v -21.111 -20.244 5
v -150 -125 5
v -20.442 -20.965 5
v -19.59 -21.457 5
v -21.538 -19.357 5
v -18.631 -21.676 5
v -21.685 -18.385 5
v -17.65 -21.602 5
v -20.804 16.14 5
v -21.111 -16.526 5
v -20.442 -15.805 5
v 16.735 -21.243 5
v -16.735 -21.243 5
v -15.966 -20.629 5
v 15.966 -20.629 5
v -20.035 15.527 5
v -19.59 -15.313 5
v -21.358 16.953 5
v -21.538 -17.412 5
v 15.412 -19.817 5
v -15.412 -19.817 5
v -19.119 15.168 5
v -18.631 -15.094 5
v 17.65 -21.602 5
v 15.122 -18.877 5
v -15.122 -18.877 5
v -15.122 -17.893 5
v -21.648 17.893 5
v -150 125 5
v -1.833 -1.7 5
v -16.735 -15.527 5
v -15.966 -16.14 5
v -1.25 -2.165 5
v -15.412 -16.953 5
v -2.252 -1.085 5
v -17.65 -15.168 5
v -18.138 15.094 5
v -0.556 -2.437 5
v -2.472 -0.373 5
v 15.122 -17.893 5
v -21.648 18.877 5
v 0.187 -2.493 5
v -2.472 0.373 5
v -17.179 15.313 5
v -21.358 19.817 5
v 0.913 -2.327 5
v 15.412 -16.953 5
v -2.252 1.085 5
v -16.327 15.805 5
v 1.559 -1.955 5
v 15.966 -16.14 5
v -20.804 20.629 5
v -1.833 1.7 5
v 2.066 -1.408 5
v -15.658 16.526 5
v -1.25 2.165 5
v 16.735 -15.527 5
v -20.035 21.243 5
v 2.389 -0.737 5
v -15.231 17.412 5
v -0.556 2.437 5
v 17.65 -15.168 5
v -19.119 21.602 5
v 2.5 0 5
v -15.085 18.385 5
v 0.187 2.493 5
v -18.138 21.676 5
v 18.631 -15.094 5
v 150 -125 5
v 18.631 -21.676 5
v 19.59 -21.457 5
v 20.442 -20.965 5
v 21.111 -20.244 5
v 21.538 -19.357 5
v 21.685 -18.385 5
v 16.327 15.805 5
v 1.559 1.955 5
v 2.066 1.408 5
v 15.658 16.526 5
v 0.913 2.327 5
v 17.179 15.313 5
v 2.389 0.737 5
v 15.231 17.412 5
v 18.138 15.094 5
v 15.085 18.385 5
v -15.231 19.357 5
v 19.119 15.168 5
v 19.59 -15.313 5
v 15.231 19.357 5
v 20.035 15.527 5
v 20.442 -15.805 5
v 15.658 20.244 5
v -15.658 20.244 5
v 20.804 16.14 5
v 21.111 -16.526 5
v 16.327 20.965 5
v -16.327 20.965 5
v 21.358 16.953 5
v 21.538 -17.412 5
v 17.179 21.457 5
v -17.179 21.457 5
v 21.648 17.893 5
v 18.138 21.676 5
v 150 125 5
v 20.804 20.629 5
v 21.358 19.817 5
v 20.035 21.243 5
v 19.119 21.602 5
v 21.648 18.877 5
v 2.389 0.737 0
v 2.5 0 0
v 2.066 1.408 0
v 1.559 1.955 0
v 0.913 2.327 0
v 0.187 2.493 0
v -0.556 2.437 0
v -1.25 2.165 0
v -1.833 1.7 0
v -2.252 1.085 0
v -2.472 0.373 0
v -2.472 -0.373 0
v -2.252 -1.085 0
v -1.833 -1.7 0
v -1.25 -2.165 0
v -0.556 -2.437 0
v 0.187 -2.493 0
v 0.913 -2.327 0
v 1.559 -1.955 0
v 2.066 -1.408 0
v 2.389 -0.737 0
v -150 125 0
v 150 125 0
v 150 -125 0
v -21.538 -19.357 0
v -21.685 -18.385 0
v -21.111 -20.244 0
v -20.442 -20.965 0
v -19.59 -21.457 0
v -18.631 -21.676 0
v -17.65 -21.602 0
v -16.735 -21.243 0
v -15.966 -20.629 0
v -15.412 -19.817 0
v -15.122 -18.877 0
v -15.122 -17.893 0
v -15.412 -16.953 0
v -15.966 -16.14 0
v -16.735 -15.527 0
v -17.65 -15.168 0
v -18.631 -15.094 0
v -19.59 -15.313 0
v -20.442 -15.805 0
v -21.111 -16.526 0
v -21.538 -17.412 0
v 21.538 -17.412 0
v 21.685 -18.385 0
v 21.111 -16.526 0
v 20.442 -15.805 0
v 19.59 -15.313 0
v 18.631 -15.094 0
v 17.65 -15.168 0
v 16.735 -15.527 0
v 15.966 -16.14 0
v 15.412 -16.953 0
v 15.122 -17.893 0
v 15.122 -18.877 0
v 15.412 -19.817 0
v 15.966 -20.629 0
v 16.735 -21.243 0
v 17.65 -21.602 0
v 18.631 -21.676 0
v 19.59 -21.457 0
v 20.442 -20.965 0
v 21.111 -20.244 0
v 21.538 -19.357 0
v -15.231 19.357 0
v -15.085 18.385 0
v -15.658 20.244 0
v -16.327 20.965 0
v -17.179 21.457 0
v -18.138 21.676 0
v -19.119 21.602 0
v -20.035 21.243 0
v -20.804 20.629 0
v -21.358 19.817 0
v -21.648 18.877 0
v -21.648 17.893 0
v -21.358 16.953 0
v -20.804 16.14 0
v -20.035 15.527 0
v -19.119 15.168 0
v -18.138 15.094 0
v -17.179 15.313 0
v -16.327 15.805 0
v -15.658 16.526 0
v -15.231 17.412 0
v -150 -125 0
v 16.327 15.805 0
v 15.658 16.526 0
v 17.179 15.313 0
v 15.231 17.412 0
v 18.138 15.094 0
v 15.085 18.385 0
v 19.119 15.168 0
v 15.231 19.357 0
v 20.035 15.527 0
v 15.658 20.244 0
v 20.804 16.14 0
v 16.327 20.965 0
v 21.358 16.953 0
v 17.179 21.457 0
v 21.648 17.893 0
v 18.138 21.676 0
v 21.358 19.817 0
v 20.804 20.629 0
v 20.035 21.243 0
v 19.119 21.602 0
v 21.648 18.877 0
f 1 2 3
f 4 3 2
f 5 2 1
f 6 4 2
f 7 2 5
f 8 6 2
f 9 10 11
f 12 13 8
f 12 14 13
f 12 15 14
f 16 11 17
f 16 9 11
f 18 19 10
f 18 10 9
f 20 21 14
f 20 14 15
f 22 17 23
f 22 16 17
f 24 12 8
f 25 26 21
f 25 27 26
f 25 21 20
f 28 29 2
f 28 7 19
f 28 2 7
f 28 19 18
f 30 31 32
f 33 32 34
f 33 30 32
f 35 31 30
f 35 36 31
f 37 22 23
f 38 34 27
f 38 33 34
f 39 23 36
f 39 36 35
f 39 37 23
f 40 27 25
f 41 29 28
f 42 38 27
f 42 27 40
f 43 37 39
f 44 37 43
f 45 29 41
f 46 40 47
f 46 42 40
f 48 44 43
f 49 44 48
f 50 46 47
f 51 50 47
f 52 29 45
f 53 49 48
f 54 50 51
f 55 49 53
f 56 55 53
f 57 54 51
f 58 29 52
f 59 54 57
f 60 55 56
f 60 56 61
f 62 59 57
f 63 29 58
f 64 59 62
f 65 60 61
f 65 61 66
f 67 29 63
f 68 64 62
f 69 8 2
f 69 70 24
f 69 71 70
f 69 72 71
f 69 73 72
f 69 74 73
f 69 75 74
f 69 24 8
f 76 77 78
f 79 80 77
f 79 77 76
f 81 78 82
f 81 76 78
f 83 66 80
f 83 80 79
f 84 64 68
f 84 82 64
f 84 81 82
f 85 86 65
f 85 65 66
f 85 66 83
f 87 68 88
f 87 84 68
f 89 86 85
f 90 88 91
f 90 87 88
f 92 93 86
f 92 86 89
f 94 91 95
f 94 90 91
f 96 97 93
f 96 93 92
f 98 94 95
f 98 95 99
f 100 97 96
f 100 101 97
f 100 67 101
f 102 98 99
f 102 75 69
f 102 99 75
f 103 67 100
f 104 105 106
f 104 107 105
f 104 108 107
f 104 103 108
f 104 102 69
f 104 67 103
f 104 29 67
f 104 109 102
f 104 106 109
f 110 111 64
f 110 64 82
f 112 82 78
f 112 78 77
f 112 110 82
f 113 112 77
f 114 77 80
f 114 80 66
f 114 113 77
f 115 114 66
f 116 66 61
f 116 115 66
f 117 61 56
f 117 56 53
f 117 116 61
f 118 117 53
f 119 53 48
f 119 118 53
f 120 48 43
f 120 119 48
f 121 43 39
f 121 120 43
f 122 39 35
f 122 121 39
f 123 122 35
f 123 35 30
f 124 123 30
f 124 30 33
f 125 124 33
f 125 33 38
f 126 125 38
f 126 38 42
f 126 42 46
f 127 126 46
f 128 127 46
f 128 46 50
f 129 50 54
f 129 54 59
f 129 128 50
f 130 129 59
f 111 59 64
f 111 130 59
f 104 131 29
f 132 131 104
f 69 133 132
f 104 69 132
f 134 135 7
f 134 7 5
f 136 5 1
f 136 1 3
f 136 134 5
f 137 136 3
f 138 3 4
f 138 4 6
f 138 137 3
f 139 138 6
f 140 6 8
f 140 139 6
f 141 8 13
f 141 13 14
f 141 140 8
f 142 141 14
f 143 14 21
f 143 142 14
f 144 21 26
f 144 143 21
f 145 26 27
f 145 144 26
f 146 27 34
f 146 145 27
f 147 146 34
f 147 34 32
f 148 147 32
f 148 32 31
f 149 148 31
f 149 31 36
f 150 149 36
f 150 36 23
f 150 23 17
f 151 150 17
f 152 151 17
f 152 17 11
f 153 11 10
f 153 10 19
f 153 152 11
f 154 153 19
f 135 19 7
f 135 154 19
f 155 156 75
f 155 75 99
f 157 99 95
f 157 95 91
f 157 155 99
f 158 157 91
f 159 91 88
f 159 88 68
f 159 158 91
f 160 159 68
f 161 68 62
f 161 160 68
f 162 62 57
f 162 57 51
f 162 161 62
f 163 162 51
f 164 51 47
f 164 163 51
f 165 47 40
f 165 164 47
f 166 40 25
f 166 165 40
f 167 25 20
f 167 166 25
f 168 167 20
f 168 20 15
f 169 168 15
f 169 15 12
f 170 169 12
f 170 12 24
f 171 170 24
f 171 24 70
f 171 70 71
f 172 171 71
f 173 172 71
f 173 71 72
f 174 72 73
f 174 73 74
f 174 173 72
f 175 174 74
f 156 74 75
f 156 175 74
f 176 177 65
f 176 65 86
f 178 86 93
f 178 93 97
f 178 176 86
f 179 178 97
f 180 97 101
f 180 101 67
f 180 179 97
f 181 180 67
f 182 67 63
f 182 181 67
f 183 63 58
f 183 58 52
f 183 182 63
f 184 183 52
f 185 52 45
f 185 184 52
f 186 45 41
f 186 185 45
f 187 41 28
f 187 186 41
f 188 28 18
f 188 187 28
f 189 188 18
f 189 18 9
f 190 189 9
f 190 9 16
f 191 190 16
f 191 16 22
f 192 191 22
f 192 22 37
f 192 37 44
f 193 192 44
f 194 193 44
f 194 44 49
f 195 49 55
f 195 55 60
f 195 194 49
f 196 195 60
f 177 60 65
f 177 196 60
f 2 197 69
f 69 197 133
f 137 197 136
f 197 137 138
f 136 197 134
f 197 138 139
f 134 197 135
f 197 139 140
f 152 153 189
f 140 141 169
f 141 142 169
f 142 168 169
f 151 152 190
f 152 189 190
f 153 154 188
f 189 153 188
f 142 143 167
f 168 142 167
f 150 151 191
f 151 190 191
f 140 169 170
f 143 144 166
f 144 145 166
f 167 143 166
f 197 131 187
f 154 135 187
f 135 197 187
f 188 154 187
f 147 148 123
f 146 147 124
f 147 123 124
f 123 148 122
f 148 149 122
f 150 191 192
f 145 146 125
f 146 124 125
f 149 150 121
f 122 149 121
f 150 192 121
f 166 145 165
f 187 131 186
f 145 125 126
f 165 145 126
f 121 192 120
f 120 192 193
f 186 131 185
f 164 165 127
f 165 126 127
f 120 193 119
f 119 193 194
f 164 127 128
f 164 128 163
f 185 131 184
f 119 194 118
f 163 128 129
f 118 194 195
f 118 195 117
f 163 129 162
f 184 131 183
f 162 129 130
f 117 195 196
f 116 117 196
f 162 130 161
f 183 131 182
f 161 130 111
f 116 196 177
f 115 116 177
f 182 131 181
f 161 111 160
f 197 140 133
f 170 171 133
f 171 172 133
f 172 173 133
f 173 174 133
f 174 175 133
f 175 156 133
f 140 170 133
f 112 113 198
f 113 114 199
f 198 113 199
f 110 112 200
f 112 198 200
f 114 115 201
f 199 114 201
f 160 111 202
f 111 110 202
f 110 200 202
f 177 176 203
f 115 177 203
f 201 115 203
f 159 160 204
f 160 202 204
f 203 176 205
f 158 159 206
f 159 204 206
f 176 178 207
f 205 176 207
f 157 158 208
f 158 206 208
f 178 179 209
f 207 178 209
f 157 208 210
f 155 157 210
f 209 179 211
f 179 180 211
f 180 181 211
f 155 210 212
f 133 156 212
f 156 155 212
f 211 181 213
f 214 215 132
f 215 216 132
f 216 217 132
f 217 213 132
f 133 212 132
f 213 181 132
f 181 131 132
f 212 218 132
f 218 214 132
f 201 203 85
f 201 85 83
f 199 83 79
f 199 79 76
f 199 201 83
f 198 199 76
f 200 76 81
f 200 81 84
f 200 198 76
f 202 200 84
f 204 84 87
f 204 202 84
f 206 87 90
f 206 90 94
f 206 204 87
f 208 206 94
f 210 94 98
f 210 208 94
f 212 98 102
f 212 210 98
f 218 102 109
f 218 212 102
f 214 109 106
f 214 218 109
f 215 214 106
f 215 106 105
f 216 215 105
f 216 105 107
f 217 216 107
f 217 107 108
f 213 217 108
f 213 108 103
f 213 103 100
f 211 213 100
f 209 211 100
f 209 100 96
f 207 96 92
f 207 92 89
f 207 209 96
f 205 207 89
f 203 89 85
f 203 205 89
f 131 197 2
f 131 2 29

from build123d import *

# Parameters (mm, degrees)
SKETCH_1_W      = 300
SKETCH_1_H      = 250
SKETCH_1_R      = 3.3
SKETCH_1_R_2    = 2.5
EXTRUDE_1_DEPTH = 5


with BuildPart() as part:
    # 草图1 → 凸台-拉伸1 (new body)
    with BuildSketch(Plane.XY):
        Rectangle(SKETCH_1_W, SKETCH_1_H)
        with Locations((-18.384776311, 18.384776311)):
            Circle(SKETCH_1_R, mode=Mode.SUBTRACT)
        with Locations(Location((18.384776311, 18.384776311, 0), (0, 0, 180))):
            Circle(SKETCH_1_R, mode=Mode.SUBTRACT)
        with Locations((18.384776311, -18.384776311)):
            Circle(SKETCH_1_R, mode=Mode.SUBTRACT)
        with Locations(Location((-18.384776311, -18.384776311, 0), (0, 0, 180))):
            Circle(SKETCH_1_R, mode=Mode.SUBTRACT)
        Circle(SKETCH_1_R_2, mode=Mode.SUBTRACT)
    extrude(amount=EXTRUDE_1_DEPTH)


solid = part.part
